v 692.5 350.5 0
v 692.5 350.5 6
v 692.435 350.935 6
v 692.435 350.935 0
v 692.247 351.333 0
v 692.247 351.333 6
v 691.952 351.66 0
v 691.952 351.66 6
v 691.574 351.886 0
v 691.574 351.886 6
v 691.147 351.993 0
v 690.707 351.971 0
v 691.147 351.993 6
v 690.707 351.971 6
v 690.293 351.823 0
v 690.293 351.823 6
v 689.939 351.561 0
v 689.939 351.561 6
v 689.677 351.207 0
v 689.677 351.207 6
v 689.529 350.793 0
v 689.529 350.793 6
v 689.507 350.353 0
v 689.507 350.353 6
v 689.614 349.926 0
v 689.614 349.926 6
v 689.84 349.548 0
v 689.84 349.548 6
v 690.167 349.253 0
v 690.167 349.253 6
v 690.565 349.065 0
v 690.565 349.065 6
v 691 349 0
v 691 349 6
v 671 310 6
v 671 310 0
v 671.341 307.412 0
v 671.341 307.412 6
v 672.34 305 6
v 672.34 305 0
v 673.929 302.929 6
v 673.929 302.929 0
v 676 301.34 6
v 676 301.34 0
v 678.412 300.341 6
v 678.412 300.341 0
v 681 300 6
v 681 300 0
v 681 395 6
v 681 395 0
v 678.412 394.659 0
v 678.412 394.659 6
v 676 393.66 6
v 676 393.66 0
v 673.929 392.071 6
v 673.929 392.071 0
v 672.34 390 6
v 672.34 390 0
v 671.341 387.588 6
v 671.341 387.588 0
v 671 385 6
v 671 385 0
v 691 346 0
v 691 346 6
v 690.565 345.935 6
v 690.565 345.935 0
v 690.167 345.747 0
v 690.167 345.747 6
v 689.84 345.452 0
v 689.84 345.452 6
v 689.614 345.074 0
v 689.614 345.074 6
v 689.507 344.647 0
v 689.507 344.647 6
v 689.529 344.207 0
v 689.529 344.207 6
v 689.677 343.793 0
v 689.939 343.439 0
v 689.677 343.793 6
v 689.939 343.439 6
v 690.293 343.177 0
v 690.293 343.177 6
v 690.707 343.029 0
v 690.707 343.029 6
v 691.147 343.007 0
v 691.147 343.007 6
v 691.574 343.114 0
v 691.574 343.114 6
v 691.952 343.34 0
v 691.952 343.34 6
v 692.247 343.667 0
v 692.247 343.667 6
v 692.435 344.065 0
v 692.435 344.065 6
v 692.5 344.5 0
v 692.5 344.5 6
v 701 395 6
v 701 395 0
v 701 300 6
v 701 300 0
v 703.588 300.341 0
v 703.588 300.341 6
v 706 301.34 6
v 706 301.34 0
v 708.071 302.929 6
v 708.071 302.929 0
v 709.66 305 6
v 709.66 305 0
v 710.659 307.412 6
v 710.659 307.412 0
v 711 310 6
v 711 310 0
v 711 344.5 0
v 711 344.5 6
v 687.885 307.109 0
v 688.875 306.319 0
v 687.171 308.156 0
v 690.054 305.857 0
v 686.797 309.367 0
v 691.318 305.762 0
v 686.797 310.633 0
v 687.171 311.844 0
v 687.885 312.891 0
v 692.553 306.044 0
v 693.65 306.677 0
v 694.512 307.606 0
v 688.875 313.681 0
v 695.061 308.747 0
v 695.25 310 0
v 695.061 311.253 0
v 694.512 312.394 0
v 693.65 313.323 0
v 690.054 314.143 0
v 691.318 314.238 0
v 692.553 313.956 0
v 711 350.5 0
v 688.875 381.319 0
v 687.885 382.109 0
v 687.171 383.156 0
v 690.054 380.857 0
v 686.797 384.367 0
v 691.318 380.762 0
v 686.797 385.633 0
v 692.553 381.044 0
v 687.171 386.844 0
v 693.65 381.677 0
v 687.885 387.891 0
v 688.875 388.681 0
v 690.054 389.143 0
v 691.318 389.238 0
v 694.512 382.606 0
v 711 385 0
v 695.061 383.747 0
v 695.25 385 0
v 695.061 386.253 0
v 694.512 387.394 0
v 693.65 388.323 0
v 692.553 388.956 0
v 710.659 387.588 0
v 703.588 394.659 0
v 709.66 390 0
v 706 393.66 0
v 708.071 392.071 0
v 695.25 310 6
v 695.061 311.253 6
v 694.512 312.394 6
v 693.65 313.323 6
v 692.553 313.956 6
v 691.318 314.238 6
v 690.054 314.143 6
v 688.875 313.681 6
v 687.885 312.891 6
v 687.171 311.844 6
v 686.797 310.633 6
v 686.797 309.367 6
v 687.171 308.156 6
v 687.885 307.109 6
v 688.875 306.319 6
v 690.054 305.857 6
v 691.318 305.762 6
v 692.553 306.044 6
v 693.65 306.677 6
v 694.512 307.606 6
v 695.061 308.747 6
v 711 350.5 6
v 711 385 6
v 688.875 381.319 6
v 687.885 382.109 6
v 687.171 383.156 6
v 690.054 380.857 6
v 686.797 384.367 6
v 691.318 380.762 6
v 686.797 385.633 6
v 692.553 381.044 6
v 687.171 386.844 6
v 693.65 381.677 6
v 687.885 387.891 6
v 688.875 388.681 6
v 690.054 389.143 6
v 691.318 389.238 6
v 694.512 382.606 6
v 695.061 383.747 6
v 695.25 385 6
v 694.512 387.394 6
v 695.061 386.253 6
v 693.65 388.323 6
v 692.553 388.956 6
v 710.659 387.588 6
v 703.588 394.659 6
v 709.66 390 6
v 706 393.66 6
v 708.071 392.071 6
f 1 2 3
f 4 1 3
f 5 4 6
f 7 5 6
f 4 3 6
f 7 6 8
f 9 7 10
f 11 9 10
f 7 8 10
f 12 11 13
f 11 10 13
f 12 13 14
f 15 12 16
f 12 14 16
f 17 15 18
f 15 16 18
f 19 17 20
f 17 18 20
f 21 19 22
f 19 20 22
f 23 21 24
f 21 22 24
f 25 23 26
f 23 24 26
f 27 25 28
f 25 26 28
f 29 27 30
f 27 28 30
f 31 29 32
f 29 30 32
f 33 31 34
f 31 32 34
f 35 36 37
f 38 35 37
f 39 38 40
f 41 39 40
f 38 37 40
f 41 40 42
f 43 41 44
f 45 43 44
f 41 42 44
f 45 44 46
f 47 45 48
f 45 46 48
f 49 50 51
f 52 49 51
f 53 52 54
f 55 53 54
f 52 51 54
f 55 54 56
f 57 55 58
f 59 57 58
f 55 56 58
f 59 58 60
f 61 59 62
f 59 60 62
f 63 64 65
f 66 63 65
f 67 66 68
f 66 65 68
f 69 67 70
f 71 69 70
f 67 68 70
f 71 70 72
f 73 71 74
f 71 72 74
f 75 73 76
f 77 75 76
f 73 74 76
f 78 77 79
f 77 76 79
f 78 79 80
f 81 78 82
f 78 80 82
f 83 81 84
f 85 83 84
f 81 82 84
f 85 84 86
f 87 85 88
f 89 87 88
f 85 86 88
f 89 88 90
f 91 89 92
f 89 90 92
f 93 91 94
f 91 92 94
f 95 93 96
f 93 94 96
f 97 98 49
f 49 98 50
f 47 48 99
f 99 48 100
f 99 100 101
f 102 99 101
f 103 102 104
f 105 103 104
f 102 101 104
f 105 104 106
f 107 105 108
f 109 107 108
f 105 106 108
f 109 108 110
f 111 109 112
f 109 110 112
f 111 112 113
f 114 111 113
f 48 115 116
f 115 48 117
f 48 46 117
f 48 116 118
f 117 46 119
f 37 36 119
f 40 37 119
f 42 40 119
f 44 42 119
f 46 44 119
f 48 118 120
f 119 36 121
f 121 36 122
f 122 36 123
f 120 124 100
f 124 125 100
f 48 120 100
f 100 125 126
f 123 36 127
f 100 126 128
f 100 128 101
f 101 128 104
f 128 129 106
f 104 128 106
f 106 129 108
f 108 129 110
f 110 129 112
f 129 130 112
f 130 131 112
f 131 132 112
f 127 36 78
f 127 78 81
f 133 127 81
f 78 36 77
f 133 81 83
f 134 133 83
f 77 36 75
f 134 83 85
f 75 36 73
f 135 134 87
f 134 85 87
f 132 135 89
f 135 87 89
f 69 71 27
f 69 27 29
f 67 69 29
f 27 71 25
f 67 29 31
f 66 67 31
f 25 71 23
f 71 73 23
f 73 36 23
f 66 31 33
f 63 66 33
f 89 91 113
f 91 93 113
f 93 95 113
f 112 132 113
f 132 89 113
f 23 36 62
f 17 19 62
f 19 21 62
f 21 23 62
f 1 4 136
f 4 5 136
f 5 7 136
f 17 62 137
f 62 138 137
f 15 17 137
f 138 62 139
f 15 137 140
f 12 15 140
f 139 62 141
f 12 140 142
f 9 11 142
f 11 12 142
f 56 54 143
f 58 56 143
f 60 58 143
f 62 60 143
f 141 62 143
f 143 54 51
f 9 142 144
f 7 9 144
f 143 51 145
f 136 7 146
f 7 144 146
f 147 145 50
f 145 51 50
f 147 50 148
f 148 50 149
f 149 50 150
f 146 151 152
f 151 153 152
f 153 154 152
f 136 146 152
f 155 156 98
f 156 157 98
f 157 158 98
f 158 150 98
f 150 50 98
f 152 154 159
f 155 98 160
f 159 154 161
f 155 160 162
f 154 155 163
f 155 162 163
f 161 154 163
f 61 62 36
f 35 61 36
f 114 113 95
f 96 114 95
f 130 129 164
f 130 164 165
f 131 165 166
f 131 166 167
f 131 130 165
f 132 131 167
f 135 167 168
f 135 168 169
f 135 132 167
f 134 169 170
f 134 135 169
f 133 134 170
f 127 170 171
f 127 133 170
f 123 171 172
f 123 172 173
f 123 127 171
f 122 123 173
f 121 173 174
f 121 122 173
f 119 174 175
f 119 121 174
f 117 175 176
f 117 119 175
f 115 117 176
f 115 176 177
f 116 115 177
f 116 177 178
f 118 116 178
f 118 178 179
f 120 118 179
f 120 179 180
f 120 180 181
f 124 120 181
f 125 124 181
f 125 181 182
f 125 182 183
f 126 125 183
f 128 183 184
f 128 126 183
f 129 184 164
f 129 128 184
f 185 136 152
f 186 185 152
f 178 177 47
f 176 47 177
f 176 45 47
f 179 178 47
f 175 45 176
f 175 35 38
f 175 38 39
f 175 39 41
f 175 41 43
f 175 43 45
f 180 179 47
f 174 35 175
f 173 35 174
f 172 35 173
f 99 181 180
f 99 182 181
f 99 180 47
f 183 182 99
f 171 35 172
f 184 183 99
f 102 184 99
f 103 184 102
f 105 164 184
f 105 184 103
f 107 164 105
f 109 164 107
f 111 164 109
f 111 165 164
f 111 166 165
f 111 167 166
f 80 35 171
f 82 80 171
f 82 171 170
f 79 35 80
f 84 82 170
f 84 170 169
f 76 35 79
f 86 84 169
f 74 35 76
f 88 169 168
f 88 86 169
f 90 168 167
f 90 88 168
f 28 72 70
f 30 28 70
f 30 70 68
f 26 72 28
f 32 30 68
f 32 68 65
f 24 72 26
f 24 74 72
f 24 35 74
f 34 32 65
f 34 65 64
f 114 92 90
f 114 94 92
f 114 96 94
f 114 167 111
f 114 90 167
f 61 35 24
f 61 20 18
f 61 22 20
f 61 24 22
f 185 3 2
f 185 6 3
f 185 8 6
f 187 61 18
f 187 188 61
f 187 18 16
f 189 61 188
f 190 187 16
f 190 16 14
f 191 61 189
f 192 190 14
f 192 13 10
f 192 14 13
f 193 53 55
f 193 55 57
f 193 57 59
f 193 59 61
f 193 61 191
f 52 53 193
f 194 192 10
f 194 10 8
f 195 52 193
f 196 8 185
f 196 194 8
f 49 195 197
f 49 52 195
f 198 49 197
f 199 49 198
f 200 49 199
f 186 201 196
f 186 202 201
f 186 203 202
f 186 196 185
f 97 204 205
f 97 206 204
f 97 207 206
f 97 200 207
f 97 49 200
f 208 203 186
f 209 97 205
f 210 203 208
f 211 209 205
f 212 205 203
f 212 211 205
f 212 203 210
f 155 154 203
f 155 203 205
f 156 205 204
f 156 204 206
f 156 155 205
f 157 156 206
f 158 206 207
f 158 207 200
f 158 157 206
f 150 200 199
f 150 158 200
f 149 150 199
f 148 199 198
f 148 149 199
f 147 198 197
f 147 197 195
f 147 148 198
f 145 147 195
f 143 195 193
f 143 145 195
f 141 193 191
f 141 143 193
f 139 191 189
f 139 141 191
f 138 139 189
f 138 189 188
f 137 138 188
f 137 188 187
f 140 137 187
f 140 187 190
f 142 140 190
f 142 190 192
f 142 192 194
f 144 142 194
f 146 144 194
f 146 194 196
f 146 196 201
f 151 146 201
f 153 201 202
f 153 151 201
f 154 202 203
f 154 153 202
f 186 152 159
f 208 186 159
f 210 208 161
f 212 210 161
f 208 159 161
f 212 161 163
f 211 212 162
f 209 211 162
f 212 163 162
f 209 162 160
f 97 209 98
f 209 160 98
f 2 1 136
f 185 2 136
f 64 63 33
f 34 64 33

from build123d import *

# Parameters (mm, degrees)
SKETCH1_R           = 4.25
BOSS_EXTRUDE1_DEPTH = 6
SKETCH3_R           = 1.5
CUT_EXTRUDE1_DEPTH  = 7


with BuildPart() as part:
    # Sketch1 → Boss-Extrude1 (new body)
    with BuildSketch(Plane.XY):
        with BuildLine():
            Line((711, 350.5), (711, 385))
            ThreePointArc((711, 385), (708.071067812, 392.071067812), (701, 395))
            Line((701, 395), (681, 395))
            ThreePointArc((681, 395), (673.928932188, 392.071067812), (671, 385))
            Line((671, 385), (671, 310))
            ThreePointArc((671, 310), (673.928932188, 302.928932188), (681, 300))
            Line((681, 300), (701, 300))
            ThreePointArc((701, 300), (708.071067812, 302.928932188), (711, 310))
            Line((711, 310), (711, 344.5))
            Line((711, 344.5), (691, 344.5))
            Line((691, 344.5), (691, 350.5))
            Line((691, 350.5), (711, 350.5))
        make_face()
        with Locations((691, 310)):
            Circle(SKETCH1_R, mode=Mode.SUBTRACT)
        with Locations((691, 385)):
            Circle(SKETCH1_R, mode=Mode.SUBTRACT)
    extrude(amount=BOSS_EXTRUDE1_DEPTH)

    # Sketch3 → Cut-Extrude1 (cut, through all)
    with BuildSketch(Plane.XY.offset(6)):
        with Locations((691, 350.5)):
            Circle(SKETCH3_R)
        with Locations((691, 344.5)):
            Circle(SKETCH3_R)
    extrude(amount=-CUT_EXTRUDE1_DEPTH, mode=Mode.SUBTRACT)


solid = part.part
